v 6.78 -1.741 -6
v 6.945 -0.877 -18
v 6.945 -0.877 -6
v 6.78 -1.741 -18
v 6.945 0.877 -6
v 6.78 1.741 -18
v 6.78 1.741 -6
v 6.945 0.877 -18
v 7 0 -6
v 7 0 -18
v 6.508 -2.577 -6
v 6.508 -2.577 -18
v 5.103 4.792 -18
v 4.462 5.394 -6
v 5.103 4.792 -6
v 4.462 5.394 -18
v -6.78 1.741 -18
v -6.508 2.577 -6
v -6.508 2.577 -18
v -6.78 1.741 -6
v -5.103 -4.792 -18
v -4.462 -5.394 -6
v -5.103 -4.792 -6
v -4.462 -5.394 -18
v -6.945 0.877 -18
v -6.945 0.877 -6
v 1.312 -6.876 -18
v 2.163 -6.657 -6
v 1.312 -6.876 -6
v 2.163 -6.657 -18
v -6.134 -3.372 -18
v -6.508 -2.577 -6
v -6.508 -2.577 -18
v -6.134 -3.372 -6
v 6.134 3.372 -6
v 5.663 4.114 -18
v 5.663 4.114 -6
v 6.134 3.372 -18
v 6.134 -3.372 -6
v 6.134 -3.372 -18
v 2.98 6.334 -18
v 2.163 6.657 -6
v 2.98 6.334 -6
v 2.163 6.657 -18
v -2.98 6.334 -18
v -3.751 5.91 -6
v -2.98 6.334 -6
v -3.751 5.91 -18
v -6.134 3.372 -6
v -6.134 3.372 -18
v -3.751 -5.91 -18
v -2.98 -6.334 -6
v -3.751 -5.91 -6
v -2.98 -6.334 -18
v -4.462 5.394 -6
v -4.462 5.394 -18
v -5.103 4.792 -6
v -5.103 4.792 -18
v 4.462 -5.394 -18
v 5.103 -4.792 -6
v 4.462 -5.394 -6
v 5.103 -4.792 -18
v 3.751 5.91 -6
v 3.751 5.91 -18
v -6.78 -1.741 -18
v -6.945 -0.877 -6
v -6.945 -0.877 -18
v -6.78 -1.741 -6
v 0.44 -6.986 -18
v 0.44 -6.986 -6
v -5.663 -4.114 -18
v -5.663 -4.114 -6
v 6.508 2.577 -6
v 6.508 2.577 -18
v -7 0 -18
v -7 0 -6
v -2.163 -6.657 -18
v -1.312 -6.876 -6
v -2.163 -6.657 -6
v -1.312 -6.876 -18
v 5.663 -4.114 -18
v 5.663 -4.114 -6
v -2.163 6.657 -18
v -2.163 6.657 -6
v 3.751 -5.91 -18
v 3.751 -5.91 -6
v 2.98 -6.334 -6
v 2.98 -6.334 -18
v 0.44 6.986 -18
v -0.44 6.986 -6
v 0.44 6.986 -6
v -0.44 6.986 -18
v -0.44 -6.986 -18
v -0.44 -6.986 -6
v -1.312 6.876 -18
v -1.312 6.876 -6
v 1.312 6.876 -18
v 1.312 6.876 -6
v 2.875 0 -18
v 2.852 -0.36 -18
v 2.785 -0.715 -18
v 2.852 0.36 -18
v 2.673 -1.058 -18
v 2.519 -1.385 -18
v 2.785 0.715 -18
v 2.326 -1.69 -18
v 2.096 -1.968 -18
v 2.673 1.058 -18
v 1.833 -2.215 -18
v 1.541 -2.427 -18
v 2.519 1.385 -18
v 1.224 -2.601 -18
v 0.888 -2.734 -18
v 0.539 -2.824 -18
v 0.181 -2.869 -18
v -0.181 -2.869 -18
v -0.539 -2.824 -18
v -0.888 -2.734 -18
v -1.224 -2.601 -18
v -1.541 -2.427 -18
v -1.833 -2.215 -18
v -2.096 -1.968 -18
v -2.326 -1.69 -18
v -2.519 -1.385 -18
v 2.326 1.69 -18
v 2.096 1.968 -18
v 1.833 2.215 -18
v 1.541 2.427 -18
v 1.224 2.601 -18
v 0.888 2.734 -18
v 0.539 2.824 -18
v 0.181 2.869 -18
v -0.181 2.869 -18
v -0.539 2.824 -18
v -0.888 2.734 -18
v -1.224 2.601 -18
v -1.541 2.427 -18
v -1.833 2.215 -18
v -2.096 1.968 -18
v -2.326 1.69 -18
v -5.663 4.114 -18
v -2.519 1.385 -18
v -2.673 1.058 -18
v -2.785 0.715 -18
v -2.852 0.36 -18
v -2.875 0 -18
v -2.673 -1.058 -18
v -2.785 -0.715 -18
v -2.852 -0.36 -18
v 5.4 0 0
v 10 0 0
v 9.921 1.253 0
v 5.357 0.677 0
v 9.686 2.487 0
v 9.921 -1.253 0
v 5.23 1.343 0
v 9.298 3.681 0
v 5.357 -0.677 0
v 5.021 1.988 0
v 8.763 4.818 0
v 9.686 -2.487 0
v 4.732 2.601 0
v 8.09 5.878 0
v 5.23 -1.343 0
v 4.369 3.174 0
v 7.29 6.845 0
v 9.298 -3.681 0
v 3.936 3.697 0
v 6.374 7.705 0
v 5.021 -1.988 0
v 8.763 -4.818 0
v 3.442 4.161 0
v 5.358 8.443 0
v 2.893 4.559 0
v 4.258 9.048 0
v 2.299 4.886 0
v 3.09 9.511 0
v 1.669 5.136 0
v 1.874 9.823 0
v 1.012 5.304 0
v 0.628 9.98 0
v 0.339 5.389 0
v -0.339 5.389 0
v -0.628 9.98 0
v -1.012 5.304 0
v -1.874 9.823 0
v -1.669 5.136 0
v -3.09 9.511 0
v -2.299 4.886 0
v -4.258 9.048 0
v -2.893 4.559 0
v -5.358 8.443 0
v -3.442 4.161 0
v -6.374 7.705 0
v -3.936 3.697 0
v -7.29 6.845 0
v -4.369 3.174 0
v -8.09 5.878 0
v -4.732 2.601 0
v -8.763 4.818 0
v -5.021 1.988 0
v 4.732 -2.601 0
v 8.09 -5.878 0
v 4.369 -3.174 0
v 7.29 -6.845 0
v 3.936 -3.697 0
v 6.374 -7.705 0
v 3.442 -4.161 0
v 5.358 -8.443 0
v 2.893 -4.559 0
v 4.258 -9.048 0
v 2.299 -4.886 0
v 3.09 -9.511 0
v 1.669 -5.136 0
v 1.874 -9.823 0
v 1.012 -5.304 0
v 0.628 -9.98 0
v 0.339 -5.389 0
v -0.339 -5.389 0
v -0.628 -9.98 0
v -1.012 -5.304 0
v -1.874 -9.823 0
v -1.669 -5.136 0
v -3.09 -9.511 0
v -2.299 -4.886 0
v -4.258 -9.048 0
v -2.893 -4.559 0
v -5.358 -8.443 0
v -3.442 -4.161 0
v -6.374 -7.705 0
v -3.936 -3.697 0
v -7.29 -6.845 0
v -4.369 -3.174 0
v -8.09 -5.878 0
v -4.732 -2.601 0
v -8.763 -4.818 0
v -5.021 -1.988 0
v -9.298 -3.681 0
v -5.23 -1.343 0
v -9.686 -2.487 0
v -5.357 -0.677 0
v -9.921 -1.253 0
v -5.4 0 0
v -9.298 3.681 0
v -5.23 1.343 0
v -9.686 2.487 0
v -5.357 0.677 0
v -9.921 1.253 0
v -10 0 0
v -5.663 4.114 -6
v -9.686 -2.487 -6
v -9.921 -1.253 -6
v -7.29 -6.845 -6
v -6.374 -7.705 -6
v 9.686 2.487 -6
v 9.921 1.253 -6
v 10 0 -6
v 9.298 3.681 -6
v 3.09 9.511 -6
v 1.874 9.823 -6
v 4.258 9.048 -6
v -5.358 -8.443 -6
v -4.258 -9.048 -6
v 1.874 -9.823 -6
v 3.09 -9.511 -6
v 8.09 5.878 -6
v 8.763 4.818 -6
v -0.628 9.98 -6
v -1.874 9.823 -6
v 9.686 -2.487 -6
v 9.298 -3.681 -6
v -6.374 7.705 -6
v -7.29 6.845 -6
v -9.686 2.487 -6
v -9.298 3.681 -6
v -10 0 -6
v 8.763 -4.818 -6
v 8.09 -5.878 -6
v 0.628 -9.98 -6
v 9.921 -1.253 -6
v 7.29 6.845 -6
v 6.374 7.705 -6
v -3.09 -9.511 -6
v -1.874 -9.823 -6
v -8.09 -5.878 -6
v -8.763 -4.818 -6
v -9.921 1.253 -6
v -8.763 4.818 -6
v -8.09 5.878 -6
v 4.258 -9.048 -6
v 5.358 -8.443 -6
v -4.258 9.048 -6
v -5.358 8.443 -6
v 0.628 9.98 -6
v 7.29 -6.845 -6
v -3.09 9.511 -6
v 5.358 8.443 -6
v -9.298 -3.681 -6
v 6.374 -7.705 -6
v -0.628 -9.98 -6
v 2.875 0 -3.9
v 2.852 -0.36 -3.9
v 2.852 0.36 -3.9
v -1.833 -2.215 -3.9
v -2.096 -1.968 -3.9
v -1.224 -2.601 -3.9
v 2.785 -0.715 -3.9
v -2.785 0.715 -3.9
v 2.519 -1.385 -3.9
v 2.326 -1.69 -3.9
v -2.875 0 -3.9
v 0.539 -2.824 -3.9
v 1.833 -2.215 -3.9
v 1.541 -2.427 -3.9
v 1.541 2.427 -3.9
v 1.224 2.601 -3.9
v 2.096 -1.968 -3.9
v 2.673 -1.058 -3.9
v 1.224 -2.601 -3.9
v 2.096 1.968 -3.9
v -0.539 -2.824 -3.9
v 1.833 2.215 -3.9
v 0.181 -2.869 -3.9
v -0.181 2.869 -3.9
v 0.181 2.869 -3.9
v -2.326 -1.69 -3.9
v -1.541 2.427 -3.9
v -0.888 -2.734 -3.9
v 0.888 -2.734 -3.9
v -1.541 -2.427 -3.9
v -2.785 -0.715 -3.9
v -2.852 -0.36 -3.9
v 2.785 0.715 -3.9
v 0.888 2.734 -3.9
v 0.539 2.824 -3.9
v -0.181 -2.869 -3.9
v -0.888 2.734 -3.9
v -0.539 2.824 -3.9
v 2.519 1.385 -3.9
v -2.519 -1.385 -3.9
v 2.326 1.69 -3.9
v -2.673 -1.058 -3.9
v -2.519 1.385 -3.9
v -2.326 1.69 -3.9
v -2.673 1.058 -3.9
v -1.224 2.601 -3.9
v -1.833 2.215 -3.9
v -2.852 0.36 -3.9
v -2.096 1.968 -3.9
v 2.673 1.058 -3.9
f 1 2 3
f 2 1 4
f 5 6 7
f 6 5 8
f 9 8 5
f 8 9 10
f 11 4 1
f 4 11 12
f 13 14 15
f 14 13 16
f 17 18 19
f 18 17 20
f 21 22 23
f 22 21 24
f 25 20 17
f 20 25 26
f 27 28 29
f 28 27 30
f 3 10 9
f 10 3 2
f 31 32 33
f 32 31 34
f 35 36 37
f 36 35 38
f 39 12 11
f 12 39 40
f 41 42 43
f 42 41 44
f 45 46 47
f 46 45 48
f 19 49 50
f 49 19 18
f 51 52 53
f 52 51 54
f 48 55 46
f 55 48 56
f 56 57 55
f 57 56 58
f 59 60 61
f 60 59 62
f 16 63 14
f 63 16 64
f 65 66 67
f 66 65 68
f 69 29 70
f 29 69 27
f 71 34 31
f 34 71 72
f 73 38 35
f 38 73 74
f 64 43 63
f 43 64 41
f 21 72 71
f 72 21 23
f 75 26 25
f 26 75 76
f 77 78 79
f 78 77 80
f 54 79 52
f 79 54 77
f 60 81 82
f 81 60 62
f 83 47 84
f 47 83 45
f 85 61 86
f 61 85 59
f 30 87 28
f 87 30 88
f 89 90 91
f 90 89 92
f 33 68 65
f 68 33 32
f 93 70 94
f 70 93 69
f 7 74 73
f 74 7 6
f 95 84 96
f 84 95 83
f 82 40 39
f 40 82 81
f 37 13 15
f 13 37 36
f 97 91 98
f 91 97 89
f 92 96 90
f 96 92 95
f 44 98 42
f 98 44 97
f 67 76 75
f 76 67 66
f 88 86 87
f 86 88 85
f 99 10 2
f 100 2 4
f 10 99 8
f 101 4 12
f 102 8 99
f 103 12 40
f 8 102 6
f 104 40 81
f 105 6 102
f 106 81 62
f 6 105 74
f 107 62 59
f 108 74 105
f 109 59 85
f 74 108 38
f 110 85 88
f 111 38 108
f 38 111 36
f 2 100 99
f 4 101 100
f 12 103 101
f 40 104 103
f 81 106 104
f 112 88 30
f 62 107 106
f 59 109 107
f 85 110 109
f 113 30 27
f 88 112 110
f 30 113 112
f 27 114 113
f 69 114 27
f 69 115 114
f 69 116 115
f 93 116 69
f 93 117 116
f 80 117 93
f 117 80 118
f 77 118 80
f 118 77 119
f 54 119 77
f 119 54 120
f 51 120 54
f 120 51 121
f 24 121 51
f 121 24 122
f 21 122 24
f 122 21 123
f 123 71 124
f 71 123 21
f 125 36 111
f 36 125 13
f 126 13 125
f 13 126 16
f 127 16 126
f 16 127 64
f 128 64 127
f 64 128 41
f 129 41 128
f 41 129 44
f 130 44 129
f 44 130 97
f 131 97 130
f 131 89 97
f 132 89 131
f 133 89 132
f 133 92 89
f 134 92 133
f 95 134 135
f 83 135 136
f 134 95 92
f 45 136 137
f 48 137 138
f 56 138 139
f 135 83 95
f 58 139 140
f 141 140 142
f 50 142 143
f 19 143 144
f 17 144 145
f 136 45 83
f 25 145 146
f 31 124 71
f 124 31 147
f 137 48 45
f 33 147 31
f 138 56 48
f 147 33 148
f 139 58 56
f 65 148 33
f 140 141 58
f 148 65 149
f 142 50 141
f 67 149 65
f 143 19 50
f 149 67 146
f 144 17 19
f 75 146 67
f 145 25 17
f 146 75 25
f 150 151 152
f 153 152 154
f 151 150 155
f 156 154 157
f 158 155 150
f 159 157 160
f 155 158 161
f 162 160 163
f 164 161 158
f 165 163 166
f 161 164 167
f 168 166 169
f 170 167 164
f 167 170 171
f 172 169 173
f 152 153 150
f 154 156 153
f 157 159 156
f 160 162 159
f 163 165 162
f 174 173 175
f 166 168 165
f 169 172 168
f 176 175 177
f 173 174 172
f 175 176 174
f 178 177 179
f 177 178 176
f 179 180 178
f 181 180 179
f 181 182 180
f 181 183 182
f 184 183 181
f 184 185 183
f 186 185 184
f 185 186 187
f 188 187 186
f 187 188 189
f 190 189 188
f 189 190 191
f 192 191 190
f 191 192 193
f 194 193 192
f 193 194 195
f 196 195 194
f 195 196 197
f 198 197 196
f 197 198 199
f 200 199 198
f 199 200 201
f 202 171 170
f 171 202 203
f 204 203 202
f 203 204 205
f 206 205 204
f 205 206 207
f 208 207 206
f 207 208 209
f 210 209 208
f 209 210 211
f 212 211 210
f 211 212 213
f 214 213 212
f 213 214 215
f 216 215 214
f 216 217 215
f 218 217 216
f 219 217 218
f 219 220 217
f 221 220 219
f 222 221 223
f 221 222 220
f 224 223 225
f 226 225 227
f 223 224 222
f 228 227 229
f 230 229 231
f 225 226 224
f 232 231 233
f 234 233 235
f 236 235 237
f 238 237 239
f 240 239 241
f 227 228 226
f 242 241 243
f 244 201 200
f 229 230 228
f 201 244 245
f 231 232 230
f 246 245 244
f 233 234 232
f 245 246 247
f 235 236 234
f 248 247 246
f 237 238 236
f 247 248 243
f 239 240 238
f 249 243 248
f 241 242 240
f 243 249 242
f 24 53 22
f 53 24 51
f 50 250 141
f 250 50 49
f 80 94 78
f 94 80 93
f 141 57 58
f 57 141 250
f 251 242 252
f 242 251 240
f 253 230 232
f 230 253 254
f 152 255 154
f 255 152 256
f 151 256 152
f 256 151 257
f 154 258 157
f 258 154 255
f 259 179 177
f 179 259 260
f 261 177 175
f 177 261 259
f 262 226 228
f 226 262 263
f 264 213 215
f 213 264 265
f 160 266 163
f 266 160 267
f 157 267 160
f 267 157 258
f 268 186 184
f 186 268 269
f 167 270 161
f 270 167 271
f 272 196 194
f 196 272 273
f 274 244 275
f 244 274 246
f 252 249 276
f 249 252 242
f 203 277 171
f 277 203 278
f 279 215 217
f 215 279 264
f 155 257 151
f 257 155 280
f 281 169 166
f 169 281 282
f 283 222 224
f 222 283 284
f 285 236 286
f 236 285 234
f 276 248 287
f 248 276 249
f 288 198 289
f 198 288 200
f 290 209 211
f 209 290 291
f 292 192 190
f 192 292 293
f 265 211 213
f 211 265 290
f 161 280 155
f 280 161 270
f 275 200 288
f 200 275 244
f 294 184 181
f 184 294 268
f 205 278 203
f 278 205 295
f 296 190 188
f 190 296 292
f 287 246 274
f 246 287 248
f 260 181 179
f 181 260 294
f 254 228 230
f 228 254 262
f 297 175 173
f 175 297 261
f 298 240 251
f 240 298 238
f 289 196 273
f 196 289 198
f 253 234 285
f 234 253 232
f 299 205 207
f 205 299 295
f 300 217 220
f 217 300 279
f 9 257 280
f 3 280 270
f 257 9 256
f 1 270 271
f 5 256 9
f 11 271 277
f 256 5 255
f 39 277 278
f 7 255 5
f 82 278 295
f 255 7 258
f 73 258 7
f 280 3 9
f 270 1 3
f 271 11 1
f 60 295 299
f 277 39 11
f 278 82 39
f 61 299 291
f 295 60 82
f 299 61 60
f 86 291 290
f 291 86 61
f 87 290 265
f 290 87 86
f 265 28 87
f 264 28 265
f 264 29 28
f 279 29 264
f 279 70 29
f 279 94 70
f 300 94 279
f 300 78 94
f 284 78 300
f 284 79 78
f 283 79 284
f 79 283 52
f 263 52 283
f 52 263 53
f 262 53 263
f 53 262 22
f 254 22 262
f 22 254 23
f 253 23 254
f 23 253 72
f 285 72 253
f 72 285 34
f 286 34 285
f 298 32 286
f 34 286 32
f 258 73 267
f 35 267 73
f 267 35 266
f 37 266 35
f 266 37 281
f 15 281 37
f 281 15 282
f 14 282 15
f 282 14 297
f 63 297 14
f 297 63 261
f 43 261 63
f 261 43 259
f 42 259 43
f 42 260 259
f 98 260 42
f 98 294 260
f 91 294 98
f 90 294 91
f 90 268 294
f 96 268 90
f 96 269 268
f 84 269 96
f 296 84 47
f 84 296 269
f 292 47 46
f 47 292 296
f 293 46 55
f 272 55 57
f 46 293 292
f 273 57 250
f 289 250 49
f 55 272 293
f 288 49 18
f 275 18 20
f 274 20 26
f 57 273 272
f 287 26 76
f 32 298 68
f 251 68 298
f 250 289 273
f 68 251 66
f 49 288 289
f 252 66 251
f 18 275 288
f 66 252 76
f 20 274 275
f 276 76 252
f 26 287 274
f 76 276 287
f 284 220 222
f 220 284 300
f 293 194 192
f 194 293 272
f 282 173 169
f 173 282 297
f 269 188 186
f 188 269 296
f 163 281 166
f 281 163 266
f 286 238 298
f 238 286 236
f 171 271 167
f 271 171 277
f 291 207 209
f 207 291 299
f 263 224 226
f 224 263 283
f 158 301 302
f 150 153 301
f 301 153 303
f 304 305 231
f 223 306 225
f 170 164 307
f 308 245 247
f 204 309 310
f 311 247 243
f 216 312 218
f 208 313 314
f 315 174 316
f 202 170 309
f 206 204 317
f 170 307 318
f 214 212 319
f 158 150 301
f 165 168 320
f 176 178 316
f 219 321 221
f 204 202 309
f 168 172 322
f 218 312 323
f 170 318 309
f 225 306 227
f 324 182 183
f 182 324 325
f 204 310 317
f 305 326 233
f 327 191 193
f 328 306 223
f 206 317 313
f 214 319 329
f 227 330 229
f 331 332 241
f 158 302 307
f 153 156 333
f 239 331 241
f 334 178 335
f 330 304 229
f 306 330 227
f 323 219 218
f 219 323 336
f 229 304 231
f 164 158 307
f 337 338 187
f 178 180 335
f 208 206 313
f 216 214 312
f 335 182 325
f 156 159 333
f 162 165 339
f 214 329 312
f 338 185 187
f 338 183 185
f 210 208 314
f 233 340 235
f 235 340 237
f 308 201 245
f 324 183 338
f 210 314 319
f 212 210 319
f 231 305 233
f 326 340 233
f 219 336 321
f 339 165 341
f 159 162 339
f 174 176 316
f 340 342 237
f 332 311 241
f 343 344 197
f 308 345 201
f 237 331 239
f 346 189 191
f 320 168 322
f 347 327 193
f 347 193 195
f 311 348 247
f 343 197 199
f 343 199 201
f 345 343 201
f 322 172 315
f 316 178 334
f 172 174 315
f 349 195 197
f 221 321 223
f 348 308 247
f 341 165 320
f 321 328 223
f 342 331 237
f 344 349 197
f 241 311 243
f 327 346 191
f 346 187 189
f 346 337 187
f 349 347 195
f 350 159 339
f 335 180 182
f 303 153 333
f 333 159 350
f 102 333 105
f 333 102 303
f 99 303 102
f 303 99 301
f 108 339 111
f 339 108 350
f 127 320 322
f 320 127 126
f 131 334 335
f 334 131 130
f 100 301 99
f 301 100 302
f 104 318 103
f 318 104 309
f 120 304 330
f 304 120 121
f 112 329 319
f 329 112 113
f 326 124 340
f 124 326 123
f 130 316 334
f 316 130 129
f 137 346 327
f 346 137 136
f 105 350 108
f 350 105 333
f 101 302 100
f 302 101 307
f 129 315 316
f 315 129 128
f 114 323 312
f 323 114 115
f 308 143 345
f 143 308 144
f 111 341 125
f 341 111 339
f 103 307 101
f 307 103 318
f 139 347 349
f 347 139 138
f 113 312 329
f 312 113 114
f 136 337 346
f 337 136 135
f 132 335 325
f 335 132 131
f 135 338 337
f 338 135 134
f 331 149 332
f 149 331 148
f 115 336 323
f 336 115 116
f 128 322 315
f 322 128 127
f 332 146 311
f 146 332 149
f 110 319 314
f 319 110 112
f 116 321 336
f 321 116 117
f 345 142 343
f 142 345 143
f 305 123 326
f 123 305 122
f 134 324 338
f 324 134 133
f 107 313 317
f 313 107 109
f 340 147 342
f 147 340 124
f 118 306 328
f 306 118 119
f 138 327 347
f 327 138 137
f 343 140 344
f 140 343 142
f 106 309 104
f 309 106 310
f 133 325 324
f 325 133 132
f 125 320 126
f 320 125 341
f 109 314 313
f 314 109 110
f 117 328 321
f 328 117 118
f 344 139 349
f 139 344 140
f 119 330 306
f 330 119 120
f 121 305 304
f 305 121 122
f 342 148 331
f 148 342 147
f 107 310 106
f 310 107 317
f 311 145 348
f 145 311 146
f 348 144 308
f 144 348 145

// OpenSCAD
$fn = 50;


difference() {
	union() {
		translate(v = [0, 0, -18.0000000000]) {
			cylinder(h = 18, r = 7.0000000000);
		}
		translate(v = [0, 0, -6.0000000000]) {
			cylinder(h = 6, r = 10.0000000000);
		}
	}
	union() {
		translate(v = [0, 0, 0]) {
			rotate(a = [0, 0, 0]) {
				difference() {
					union() {
						#translate(v = [0, 0, -18.0000000000]) {
							cylinder(h = 18, r = 2.6000000000);
						}
						#translate(v = [0, 0, -3.9000000000]) {
							cylinder(h = 3.9000000000, r1 = 2.8750000000, r2 = 5.4000000000);
						}
						#translate(v = [0, 0, -18.0000000000]) {
							cylinder(h = 18, r = 2.8750000000);
						}
						#translate(v = [0, 0, -18.0000000000]) {
							cylinder(h = 18, r = 2.6000000000);
						}
					}
					union();
				}
			}
		}
	}
}
